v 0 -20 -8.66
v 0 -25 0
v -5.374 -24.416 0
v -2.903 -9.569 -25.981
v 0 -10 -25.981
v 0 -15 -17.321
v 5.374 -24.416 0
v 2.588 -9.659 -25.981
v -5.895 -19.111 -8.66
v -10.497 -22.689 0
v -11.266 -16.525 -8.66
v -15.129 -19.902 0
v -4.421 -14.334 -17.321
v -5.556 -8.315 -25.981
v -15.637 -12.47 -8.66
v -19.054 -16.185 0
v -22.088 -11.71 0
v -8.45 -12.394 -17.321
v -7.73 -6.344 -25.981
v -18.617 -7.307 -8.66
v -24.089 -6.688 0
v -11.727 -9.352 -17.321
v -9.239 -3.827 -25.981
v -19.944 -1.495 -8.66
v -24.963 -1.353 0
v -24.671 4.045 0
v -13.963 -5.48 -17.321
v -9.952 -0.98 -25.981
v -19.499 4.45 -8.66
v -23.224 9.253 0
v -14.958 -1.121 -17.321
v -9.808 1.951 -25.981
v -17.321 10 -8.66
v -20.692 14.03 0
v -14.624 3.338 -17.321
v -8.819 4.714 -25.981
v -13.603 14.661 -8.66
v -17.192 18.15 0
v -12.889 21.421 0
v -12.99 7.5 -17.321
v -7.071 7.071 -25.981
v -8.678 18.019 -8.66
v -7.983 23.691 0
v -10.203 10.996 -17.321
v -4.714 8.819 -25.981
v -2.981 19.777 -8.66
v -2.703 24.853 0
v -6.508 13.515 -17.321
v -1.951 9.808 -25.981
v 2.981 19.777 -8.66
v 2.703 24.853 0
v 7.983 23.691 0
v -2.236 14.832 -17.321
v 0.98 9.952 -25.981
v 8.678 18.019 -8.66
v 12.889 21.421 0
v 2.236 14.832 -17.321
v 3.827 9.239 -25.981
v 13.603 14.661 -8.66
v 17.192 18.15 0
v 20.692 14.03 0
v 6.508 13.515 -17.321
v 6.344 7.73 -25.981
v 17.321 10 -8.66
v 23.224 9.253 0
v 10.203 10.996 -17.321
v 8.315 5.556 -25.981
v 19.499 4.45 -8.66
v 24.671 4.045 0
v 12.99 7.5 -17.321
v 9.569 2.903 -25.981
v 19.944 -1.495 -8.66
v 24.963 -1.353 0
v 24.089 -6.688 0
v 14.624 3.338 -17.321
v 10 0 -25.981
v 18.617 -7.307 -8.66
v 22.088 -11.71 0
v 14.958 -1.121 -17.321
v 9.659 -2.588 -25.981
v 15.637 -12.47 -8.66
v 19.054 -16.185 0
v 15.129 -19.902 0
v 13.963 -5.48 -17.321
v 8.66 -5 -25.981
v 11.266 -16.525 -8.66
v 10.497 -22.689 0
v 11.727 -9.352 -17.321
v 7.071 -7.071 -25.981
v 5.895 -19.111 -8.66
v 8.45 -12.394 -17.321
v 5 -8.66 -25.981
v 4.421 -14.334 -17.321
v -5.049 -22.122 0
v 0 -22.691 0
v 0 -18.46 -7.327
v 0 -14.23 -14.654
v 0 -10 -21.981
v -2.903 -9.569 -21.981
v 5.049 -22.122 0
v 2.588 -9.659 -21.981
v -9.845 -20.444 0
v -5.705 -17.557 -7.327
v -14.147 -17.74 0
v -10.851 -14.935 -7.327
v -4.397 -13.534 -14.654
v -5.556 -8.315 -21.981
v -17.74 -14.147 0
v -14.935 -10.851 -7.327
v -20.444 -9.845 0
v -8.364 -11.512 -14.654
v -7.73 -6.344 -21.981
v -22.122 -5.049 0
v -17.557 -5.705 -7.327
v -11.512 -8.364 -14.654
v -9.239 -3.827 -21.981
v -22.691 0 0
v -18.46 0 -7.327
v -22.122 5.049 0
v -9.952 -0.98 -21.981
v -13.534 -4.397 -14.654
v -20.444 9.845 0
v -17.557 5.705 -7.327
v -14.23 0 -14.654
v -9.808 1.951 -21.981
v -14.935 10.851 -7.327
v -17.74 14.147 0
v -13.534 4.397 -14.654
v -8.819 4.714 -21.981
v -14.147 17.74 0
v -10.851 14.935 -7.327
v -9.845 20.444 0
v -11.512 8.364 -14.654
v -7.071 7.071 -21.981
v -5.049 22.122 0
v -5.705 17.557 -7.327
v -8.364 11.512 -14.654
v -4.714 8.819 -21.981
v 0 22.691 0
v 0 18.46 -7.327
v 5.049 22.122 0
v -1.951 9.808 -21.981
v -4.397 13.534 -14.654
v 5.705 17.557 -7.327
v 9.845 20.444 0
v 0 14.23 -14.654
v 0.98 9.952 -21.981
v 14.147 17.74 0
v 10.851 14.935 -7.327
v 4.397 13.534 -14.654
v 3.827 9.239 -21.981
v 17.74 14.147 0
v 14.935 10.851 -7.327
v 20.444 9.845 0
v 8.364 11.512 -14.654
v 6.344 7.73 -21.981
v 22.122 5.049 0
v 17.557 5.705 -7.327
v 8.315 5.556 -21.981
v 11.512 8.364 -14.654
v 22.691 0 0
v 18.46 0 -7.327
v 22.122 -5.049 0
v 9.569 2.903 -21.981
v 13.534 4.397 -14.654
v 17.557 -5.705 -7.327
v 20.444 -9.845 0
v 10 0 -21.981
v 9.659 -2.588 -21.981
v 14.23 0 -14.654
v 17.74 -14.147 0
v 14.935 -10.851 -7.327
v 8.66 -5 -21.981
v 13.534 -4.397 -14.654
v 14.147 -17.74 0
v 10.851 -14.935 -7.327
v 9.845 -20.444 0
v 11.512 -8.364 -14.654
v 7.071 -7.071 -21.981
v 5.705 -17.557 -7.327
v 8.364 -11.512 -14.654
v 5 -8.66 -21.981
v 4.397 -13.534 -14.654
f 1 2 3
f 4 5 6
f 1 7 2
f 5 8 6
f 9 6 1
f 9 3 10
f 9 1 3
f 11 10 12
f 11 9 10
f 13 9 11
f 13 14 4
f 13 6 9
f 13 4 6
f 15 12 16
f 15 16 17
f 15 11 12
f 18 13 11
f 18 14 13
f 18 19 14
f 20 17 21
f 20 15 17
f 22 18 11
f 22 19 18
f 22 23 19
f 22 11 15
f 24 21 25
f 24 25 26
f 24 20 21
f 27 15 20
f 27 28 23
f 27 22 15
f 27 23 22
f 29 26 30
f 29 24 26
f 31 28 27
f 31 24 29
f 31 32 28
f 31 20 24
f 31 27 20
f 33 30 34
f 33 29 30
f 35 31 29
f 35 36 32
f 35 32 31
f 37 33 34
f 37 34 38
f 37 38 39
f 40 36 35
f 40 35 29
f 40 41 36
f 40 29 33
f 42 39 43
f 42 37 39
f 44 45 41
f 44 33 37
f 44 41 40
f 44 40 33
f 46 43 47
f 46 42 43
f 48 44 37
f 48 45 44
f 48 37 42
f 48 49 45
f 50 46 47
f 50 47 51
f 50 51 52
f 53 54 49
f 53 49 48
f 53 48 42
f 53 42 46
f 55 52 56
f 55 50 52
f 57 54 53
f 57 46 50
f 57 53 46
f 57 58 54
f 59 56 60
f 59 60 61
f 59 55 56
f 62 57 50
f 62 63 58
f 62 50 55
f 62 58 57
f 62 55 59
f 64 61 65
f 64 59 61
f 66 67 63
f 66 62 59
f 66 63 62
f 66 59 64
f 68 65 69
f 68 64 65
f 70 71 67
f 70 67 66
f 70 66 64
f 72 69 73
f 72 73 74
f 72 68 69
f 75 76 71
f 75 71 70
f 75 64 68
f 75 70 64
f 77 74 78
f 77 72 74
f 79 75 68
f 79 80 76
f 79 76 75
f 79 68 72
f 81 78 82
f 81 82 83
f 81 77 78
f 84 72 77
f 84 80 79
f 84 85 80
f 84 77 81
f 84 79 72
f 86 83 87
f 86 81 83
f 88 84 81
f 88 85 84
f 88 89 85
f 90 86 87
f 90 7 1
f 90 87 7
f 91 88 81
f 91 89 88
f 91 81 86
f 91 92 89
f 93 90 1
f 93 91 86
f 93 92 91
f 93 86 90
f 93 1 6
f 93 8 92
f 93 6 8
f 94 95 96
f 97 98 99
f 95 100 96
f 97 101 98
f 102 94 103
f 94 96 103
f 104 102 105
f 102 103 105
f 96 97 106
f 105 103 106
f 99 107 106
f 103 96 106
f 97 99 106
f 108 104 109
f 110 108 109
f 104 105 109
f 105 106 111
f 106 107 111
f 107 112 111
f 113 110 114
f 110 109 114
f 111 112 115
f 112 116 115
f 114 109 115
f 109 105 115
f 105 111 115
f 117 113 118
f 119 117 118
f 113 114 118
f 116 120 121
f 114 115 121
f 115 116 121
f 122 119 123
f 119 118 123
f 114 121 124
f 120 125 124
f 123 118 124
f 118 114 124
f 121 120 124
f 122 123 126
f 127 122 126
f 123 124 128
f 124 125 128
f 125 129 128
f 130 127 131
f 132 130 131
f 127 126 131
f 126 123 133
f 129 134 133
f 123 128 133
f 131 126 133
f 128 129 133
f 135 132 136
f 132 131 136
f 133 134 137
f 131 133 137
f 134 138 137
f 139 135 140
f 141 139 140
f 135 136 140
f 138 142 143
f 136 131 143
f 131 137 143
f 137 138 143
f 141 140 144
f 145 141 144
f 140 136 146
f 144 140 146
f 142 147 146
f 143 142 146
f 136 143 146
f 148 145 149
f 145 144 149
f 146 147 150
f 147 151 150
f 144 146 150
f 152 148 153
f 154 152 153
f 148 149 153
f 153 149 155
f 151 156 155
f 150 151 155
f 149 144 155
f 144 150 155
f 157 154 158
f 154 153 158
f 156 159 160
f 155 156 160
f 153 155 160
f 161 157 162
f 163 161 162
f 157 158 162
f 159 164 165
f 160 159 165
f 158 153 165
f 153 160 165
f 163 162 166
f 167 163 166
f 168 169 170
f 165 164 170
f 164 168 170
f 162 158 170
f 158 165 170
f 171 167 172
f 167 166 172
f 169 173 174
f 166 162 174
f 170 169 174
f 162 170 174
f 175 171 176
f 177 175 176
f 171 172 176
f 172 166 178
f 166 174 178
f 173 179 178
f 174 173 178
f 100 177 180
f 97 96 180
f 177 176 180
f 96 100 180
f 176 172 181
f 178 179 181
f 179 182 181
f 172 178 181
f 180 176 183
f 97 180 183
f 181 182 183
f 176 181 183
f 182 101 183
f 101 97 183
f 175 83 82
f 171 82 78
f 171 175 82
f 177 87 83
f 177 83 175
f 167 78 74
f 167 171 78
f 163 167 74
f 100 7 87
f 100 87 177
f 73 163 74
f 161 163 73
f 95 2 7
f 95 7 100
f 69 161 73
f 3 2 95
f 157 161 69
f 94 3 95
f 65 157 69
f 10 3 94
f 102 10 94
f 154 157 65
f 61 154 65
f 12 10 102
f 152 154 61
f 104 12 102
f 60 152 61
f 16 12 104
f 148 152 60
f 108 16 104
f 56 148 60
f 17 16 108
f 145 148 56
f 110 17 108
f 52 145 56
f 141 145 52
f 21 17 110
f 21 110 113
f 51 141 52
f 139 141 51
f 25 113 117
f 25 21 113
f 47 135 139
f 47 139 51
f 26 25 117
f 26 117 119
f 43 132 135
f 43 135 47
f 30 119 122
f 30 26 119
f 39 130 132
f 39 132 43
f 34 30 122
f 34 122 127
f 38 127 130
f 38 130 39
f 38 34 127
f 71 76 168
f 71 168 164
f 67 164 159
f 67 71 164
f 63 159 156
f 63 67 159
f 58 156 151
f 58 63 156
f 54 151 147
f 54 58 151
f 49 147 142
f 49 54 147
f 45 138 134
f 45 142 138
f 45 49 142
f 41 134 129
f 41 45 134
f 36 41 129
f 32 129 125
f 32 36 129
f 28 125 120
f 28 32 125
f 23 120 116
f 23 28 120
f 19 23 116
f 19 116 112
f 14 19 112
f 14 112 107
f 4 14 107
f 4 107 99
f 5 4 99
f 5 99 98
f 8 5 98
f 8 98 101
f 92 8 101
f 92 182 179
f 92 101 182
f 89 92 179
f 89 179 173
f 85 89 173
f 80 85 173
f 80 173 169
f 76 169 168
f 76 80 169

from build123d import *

# Parameters (mm, degrees)
WANDUNG1_T                           = -2
SCHNITT_LINEAR_AUSTRAGEN1_DEPTH      = 56.901699437
SCHNITT_LINEAR_AUSTRAGEN1_DEPTH_BACK = 56.901699437
SKIZZE3_R                            = 10


with BuildPart() as part:
    # Aufsatz-Linear austragen1 cone 1 section (through the dimple's axis) → Aufsatz-Linear austragen1 (revolve)
    with BuildSketch(Plane(origin=(0, 0, 0), x_dir=(0, -1, 0), z_dir=(1, 0, 0))):
        Polygon((0, 0), (25, 0), (0, 43.301270189), align=None)
    revolve(axis=Axis((0, 0, 0), (0, 0, -1)))

    # Wandung1
    wandung1_openings = [part.faces().sort_by_distance(p)[0] for p in [
        (0, 0, 0),
    ]]
    offset(amount=WANDUNG1_T, openings=wandung1_openings, kind=Kind.INTERSECTION)

    # Skizze3 → Schnitt-Linear austragen1 (cut, two sides: drawn at the far end of the back side and taken through both)
    with BuildSketch(Plane.XY.offset(-SCHNITT_LINEAR_AUSTRAGEN1_DEPTH_BACK)):
        Circle(SKIZZE3_R)
    extrude(amount=SCHNITT_LINEAR_AUSTRAGEN1_DEPTH + SCHNITT_LINEAR_AUSTRAGEN1_DEPTH_BACK, mode=Mode.SUBTRACT)


solid = part.part
